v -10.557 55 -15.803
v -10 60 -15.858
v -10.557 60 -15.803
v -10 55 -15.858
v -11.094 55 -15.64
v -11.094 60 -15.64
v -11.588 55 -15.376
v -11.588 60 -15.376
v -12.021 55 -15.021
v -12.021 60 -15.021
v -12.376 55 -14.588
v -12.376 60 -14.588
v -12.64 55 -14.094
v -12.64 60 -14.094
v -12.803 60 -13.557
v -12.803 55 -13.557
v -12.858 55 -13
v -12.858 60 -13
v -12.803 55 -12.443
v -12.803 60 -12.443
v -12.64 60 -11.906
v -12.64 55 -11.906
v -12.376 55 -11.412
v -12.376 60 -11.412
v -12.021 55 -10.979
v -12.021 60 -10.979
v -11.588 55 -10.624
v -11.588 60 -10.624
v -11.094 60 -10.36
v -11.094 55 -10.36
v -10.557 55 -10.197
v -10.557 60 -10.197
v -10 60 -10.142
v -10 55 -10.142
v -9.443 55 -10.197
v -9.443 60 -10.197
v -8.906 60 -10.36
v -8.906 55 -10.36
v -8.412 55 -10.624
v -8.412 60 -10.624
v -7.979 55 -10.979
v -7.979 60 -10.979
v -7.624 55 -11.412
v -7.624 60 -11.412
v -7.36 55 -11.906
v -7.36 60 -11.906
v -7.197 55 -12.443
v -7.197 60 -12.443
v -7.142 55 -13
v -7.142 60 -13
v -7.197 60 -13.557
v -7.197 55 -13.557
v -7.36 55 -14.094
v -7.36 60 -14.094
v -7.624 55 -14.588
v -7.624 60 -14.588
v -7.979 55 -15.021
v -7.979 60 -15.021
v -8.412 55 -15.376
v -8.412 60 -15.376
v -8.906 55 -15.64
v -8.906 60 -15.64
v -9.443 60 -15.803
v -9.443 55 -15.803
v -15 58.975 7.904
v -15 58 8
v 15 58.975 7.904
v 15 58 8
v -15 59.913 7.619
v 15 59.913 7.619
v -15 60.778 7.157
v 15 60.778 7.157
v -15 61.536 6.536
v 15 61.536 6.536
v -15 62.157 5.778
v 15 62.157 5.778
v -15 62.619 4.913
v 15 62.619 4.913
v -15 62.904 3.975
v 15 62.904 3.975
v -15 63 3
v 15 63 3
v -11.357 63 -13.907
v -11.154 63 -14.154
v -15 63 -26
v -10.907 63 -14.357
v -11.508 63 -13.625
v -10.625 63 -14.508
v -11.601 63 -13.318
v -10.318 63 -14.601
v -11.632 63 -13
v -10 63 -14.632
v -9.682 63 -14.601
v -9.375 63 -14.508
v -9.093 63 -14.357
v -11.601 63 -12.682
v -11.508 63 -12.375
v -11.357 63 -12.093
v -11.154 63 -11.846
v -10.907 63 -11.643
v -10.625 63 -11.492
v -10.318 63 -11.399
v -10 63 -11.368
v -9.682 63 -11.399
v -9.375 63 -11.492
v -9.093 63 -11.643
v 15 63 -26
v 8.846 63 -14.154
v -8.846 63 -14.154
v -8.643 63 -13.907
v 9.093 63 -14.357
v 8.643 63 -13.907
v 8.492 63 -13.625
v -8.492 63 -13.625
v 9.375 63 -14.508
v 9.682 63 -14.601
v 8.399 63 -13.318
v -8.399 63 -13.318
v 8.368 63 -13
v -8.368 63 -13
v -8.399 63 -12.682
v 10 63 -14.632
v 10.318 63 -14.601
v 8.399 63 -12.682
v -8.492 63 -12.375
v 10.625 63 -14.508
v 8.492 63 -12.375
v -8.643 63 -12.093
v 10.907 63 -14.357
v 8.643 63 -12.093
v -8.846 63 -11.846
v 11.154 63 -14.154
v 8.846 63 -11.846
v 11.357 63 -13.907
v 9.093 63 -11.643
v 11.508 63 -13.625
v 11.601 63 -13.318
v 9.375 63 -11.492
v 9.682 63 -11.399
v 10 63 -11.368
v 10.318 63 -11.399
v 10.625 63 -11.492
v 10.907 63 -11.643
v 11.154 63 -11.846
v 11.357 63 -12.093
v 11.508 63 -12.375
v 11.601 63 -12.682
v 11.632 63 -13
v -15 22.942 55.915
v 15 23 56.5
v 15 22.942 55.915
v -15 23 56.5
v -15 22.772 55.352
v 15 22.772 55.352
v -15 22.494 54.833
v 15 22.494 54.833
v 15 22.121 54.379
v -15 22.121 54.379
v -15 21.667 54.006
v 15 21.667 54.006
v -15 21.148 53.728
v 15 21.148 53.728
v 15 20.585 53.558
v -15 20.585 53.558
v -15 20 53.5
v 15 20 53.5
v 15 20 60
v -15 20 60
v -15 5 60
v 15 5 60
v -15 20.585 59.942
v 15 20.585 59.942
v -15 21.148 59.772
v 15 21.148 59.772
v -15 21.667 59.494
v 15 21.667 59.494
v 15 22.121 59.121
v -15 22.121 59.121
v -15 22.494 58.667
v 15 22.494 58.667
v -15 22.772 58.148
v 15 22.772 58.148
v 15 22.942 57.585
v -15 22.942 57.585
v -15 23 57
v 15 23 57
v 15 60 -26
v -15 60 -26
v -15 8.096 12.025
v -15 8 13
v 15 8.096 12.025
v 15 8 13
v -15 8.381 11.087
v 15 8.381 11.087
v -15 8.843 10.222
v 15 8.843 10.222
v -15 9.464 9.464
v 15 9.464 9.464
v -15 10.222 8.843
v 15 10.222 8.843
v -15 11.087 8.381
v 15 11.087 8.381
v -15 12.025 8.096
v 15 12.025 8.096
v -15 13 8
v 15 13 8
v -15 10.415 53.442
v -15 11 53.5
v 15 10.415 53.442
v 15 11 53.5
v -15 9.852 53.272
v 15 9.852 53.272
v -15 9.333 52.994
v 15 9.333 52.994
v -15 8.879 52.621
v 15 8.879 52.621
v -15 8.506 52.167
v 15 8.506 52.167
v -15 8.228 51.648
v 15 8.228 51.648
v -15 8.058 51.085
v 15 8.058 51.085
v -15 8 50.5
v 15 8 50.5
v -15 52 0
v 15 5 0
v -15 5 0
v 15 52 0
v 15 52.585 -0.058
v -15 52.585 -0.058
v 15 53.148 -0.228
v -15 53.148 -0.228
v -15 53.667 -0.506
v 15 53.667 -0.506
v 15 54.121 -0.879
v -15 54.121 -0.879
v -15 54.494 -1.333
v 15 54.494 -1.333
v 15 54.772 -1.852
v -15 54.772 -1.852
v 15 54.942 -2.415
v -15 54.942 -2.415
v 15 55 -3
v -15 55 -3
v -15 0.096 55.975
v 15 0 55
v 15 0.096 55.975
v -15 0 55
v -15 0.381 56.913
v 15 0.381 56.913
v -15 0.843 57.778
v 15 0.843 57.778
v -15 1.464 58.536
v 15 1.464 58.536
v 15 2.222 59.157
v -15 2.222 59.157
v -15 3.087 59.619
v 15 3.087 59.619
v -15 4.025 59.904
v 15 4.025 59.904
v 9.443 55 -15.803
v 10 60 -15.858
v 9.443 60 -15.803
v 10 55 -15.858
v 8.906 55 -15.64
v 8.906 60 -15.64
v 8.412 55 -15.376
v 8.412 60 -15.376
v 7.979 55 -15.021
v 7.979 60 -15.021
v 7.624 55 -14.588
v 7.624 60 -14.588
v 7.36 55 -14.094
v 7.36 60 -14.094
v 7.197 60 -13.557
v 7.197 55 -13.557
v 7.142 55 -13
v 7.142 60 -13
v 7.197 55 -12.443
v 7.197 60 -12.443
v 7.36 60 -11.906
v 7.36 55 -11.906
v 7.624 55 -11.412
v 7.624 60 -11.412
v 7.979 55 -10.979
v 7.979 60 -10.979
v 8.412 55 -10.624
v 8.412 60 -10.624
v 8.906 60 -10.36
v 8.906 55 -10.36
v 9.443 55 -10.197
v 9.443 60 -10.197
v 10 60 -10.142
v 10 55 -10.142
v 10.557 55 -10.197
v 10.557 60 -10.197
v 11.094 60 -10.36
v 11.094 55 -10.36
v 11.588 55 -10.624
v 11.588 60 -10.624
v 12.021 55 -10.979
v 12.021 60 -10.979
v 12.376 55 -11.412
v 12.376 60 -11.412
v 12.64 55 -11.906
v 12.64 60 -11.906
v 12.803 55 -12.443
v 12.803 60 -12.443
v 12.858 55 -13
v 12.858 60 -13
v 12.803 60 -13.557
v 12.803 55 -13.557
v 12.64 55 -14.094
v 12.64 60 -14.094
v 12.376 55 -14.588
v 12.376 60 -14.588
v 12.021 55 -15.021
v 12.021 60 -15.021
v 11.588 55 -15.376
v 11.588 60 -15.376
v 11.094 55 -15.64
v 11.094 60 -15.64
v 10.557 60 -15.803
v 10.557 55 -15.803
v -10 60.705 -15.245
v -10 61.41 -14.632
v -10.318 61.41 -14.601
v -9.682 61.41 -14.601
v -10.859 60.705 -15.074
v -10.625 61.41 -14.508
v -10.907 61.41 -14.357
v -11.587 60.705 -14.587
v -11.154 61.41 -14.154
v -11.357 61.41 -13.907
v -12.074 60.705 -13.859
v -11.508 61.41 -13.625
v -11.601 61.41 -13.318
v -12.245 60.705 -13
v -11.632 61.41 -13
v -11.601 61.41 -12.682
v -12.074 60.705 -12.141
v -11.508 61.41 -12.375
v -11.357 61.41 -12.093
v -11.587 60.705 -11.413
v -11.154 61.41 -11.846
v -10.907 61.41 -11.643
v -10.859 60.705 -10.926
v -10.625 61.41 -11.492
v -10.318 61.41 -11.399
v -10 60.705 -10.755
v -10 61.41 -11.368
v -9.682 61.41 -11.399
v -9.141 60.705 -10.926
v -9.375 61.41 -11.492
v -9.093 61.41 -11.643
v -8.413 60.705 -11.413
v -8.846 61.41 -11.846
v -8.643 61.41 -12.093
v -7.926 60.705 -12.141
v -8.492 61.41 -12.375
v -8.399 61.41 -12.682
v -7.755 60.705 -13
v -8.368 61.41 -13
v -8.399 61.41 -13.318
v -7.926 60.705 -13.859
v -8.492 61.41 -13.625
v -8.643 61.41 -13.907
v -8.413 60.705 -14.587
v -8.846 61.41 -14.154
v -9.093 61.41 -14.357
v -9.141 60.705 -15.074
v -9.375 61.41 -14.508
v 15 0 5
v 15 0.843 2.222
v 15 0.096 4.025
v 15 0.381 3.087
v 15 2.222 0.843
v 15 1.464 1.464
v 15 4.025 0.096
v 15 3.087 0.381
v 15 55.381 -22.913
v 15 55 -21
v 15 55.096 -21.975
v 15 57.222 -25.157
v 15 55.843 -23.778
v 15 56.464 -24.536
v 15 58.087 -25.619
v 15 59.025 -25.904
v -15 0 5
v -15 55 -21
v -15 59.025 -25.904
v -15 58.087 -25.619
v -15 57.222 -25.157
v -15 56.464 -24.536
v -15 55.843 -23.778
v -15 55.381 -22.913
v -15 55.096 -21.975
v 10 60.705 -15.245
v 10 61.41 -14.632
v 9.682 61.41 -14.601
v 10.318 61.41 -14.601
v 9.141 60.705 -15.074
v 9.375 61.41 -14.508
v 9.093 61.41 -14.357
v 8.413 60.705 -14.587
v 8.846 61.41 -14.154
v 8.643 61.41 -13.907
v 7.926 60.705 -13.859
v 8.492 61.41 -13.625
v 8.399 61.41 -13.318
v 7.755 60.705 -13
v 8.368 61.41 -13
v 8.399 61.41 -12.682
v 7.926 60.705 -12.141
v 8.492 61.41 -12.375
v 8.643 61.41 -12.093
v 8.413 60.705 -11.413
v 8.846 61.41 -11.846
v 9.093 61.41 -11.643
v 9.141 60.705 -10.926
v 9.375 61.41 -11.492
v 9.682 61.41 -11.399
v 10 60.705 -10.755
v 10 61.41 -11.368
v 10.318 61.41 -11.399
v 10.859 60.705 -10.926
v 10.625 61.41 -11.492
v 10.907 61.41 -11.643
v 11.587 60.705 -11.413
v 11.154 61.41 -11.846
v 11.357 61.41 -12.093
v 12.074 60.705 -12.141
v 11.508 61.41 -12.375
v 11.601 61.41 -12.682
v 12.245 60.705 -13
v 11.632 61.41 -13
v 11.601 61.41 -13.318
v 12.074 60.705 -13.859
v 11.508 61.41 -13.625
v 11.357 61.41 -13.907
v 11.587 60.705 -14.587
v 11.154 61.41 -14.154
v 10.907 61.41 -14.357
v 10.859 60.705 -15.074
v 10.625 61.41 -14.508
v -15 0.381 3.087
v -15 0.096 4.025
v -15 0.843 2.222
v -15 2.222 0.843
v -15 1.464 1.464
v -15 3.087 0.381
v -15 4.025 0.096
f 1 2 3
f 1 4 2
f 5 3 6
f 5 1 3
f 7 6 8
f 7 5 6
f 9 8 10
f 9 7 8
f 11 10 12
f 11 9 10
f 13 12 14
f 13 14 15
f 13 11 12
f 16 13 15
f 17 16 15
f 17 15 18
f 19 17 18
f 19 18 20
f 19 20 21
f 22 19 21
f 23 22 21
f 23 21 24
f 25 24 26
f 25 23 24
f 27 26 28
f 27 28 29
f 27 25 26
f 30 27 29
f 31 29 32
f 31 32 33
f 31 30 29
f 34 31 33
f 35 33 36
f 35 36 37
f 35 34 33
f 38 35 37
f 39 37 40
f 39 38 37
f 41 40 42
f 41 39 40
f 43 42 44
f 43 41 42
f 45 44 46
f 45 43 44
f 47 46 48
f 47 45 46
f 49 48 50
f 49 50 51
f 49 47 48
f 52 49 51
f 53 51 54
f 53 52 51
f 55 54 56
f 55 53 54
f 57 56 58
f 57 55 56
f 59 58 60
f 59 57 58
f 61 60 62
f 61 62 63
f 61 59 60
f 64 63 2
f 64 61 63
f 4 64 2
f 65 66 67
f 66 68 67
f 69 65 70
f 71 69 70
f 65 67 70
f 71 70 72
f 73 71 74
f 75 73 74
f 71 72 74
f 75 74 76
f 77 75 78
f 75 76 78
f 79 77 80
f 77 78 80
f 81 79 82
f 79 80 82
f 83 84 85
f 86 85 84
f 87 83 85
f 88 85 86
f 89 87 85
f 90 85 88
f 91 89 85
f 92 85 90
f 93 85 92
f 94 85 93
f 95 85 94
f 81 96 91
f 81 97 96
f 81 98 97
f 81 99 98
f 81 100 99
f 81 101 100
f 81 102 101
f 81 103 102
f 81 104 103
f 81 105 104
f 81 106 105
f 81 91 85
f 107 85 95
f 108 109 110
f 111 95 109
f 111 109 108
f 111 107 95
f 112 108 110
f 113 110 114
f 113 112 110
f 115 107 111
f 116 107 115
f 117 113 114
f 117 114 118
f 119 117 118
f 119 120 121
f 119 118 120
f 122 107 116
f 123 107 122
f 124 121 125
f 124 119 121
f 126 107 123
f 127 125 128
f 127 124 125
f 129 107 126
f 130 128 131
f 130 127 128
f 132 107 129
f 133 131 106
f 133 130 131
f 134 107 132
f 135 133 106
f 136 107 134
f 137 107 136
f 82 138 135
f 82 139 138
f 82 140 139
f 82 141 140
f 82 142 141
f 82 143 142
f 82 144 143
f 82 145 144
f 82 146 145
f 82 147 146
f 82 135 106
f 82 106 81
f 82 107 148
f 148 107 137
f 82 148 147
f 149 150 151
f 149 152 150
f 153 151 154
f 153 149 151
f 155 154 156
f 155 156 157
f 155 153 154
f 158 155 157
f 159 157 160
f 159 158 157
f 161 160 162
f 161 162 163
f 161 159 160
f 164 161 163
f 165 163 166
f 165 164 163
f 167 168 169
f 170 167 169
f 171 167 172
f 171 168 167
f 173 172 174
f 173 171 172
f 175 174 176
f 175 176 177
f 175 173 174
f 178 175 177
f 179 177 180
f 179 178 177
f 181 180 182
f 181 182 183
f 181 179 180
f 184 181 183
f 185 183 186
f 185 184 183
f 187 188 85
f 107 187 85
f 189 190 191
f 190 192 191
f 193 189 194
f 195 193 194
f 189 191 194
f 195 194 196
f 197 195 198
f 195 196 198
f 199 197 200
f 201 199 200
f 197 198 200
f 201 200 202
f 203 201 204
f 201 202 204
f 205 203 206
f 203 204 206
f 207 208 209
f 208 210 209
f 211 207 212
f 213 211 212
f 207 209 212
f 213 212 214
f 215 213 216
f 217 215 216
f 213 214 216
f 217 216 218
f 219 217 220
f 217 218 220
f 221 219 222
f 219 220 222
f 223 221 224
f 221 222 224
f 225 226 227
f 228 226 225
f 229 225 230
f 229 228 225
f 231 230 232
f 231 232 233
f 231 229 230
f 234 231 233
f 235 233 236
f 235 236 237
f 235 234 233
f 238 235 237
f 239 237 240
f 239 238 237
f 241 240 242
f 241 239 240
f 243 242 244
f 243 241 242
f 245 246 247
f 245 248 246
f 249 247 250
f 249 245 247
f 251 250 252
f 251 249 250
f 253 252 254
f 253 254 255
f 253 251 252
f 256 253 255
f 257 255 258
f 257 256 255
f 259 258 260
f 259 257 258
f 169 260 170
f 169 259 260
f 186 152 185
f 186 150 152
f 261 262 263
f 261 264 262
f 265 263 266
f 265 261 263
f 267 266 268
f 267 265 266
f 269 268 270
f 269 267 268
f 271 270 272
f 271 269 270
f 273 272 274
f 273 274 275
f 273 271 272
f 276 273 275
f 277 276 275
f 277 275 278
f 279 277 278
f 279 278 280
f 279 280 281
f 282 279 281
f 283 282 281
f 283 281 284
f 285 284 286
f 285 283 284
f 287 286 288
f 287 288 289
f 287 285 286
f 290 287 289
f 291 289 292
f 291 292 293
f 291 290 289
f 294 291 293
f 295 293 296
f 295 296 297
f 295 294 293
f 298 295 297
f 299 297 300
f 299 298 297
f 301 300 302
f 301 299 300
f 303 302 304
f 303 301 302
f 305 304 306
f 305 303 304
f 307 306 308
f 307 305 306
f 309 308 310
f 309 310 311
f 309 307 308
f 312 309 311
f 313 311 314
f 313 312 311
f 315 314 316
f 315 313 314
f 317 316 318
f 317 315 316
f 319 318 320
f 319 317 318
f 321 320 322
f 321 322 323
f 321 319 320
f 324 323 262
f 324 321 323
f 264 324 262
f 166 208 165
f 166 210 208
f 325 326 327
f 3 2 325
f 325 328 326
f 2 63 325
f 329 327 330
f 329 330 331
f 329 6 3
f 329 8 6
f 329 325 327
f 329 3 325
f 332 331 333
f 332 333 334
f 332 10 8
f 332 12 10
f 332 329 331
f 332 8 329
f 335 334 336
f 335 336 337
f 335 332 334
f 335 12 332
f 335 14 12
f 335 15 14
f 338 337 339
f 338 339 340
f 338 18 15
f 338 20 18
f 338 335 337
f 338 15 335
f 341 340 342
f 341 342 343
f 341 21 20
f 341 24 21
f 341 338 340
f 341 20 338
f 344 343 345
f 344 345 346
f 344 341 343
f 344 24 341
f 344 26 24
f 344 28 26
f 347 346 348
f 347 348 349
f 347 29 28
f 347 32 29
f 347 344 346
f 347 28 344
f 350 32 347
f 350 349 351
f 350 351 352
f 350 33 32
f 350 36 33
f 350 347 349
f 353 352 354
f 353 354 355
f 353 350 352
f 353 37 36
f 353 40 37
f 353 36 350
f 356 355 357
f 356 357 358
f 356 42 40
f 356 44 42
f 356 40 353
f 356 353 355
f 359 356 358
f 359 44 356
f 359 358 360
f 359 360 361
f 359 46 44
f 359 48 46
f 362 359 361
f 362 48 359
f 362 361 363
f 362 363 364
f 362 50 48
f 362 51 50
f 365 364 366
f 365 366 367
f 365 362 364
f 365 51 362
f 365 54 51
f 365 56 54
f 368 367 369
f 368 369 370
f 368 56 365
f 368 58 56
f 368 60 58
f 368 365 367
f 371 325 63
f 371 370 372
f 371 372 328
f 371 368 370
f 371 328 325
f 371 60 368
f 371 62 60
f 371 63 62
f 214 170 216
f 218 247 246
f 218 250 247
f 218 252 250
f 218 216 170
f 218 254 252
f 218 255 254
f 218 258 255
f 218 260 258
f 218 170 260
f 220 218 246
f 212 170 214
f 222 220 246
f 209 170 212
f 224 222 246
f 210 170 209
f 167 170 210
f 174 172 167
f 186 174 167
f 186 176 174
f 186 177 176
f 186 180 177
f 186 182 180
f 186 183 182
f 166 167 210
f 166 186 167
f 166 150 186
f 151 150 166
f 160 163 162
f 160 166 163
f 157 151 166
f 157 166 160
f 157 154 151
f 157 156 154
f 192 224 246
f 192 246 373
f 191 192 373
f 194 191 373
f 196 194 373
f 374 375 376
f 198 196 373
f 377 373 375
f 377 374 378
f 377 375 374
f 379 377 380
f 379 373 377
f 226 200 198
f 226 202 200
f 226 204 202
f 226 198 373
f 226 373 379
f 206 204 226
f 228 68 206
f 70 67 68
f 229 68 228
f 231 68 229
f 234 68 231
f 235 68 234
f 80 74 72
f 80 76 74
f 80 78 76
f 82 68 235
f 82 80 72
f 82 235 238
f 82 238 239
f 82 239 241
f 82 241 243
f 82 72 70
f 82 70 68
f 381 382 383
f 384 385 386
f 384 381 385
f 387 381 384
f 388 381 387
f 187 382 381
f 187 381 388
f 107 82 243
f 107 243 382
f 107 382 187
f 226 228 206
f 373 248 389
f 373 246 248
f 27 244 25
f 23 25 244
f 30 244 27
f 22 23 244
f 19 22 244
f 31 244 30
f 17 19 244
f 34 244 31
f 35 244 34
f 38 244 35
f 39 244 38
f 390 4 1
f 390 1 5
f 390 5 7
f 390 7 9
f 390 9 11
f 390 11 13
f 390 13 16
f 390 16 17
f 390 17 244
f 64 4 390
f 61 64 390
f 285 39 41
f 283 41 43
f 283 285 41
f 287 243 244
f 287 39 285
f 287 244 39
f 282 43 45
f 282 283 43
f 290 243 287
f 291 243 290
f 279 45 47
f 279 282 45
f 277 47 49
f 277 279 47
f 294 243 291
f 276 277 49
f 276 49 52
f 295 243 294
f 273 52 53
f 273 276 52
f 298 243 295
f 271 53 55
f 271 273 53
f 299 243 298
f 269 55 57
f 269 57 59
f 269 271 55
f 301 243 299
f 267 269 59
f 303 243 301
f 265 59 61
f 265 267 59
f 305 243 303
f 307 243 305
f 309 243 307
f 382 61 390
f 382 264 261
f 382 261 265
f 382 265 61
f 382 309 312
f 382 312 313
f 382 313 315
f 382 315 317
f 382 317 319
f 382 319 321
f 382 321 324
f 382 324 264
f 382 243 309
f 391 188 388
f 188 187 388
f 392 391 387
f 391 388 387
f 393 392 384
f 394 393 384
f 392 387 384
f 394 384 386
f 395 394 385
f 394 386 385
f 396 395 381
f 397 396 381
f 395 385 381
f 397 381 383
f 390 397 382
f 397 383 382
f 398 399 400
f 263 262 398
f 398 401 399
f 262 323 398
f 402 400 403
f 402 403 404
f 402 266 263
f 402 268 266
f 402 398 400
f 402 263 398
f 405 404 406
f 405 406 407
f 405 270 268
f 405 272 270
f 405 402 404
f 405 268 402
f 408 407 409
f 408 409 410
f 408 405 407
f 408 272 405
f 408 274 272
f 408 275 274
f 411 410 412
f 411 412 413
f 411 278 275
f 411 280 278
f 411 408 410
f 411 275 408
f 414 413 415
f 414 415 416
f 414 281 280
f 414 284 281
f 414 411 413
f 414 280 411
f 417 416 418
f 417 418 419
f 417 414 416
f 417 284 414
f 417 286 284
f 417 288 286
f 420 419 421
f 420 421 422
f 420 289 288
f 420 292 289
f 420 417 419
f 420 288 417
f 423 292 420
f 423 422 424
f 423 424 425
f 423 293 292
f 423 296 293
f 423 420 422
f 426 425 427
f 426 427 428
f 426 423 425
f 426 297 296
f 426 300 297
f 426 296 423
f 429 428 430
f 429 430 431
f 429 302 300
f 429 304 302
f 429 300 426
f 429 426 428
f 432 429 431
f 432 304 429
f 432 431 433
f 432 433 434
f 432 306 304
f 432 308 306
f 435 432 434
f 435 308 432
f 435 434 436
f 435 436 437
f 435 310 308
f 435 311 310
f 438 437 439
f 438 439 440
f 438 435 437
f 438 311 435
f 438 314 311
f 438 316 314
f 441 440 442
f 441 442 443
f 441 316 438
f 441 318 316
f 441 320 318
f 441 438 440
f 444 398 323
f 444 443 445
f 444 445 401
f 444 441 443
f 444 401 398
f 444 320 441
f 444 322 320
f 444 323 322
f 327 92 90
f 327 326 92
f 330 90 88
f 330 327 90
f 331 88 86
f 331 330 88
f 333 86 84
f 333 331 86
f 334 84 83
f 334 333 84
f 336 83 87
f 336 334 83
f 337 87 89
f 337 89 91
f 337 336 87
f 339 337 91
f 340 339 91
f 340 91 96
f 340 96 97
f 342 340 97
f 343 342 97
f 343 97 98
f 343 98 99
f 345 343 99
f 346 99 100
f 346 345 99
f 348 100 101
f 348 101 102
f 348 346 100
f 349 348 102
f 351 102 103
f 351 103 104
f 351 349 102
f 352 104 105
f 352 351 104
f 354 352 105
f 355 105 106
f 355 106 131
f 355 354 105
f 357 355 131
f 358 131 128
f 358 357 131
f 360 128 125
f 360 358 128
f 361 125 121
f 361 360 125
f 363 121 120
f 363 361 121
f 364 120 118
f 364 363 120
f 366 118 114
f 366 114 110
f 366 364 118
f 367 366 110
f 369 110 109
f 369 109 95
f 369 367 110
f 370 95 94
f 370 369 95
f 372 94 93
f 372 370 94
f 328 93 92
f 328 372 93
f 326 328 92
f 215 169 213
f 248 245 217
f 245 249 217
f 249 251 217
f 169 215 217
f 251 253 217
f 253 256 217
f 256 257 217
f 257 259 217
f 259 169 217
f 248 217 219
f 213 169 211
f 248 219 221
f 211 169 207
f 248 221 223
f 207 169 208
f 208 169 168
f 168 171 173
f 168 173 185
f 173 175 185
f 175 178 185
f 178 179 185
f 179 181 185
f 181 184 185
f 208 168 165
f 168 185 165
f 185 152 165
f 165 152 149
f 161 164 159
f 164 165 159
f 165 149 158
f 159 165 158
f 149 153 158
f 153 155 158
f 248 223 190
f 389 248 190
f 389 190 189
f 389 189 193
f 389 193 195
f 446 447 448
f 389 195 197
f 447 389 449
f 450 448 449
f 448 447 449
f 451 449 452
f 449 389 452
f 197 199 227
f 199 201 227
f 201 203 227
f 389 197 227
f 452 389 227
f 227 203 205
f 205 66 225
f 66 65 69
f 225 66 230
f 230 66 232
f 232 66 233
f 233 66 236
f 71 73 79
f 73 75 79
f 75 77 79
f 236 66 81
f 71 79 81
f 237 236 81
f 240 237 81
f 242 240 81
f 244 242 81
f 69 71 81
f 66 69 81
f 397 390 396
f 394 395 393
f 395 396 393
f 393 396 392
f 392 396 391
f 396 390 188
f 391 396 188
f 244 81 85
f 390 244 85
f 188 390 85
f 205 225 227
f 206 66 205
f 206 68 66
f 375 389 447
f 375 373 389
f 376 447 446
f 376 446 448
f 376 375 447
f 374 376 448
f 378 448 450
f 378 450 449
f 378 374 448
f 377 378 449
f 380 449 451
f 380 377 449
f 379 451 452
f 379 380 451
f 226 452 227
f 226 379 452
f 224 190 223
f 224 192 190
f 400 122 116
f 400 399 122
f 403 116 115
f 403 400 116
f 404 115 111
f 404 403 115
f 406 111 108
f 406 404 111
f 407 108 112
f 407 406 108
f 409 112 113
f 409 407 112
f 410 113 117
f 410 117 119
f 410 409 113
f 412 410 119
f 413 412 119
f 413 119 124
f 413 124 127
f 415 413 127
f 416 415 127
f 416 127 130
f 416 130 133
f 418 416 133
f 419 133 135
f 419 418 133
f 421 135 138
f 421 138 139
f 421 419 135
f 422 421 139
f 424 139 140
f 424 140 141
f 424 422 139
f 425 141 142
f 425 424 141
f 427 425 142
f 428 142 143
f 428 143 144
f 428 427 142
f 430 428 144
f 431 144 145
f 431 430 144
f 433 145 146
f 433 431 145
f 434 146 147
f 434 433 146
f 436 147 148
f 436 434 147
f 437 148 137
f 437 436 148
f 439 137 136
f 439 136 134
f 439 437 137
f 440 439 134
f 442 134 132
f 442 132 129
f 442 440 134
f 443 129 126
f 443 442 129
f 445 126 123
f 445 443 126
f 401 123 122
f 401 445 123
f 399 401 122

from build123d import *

# Parameters (mm, degrees)
BOSS_EXTRUDE1_DEPTH                           = 15
FILLET1_R                                     = 5
FILLET2_R                                     = 3
CSK_FOR_4_FLAT_HEAD_MACHINE_SCREW2_AT_2_COUNT = 2
CSK_FOR_4_FLAT_HEAD_MACHINE_SCREW2_AT_2_PITCH = 20


with BuildPart() as part:
    # Sketch1 → Boss-Extrude1 (new body, symmetric)
    with BuildSketch(Plane(origin=(0, 0, 0), x_dir=(0, 0, -1), z_dir=(1, 0, 0))):
        Polygon((-60, 0), (0, 0), (0, 55), (26, 55), (26, 63), (-8, 63), (-8, 8), (-53.5, 8), (-53.5, 23), (-60, 23), align=None)
    extrude(amount=BOSS_EXTRUDE1_DEPTH, both=True)

    # Fillet1
    fillet1_edges = [part.edges().sort_by_distance(p)[0] for p in [
        (0, 8, 8),
        (0, 63, 8),
        (0, 55, -26),
        (0, 0, 0),
        (0, 0, 60),
    ]]
    fillet(fillet1_edges, radius=FILLET1_R)

    # Fillet2
    fillet2_edges = [part.edges().sort_by_distance(p)[0] for p in [
        (0, 23, 60),
        (0, 23, 53.5),
        (0, 8, 53.5),
        (0, 55, 0),
    ]]
    fillet(fillet2_edges, radius=FILLET2_R)

    # Sketch6 → CSK for #4 Flat Head Machine Screw2 (revolve, cut)
    with BuildSketch(Plane(origin=(-10, 55, -13), x_dir=(0, 0, -1), z_dir=(1, 0, 0))):
        Polygon((0, 0), (0, 8), (1.63195, 8), (1.63195, 6.409835609), (2.857501397, 5), (2.857501397, 0), align=None)
    csk_for_4_flat_head_machine_screw2 = revolve(axis=Axis((-10, 48.65, -13), (0, 1, 0)), mode=Mode.SUBTRACT)

    # CSK for #4 Flat Head Machine Screw2 at 2: CSK for #4 Flat Head Machine Screw2 ×2
    with Locations(*[(i * CSK_FOR_4_FLAT_HEAD_MACHINE_SCREW2_AT_2_PITCH, 0, 0) for i in range(1, CSK_FOR_4_FLAT_HEAD_MACHINE_SCREW2_AT_2_COUNT)]):
        add(csk_for_4_flat_head_machine_screw2, mode=Mode.SUBTRACT)


solid = part.part
